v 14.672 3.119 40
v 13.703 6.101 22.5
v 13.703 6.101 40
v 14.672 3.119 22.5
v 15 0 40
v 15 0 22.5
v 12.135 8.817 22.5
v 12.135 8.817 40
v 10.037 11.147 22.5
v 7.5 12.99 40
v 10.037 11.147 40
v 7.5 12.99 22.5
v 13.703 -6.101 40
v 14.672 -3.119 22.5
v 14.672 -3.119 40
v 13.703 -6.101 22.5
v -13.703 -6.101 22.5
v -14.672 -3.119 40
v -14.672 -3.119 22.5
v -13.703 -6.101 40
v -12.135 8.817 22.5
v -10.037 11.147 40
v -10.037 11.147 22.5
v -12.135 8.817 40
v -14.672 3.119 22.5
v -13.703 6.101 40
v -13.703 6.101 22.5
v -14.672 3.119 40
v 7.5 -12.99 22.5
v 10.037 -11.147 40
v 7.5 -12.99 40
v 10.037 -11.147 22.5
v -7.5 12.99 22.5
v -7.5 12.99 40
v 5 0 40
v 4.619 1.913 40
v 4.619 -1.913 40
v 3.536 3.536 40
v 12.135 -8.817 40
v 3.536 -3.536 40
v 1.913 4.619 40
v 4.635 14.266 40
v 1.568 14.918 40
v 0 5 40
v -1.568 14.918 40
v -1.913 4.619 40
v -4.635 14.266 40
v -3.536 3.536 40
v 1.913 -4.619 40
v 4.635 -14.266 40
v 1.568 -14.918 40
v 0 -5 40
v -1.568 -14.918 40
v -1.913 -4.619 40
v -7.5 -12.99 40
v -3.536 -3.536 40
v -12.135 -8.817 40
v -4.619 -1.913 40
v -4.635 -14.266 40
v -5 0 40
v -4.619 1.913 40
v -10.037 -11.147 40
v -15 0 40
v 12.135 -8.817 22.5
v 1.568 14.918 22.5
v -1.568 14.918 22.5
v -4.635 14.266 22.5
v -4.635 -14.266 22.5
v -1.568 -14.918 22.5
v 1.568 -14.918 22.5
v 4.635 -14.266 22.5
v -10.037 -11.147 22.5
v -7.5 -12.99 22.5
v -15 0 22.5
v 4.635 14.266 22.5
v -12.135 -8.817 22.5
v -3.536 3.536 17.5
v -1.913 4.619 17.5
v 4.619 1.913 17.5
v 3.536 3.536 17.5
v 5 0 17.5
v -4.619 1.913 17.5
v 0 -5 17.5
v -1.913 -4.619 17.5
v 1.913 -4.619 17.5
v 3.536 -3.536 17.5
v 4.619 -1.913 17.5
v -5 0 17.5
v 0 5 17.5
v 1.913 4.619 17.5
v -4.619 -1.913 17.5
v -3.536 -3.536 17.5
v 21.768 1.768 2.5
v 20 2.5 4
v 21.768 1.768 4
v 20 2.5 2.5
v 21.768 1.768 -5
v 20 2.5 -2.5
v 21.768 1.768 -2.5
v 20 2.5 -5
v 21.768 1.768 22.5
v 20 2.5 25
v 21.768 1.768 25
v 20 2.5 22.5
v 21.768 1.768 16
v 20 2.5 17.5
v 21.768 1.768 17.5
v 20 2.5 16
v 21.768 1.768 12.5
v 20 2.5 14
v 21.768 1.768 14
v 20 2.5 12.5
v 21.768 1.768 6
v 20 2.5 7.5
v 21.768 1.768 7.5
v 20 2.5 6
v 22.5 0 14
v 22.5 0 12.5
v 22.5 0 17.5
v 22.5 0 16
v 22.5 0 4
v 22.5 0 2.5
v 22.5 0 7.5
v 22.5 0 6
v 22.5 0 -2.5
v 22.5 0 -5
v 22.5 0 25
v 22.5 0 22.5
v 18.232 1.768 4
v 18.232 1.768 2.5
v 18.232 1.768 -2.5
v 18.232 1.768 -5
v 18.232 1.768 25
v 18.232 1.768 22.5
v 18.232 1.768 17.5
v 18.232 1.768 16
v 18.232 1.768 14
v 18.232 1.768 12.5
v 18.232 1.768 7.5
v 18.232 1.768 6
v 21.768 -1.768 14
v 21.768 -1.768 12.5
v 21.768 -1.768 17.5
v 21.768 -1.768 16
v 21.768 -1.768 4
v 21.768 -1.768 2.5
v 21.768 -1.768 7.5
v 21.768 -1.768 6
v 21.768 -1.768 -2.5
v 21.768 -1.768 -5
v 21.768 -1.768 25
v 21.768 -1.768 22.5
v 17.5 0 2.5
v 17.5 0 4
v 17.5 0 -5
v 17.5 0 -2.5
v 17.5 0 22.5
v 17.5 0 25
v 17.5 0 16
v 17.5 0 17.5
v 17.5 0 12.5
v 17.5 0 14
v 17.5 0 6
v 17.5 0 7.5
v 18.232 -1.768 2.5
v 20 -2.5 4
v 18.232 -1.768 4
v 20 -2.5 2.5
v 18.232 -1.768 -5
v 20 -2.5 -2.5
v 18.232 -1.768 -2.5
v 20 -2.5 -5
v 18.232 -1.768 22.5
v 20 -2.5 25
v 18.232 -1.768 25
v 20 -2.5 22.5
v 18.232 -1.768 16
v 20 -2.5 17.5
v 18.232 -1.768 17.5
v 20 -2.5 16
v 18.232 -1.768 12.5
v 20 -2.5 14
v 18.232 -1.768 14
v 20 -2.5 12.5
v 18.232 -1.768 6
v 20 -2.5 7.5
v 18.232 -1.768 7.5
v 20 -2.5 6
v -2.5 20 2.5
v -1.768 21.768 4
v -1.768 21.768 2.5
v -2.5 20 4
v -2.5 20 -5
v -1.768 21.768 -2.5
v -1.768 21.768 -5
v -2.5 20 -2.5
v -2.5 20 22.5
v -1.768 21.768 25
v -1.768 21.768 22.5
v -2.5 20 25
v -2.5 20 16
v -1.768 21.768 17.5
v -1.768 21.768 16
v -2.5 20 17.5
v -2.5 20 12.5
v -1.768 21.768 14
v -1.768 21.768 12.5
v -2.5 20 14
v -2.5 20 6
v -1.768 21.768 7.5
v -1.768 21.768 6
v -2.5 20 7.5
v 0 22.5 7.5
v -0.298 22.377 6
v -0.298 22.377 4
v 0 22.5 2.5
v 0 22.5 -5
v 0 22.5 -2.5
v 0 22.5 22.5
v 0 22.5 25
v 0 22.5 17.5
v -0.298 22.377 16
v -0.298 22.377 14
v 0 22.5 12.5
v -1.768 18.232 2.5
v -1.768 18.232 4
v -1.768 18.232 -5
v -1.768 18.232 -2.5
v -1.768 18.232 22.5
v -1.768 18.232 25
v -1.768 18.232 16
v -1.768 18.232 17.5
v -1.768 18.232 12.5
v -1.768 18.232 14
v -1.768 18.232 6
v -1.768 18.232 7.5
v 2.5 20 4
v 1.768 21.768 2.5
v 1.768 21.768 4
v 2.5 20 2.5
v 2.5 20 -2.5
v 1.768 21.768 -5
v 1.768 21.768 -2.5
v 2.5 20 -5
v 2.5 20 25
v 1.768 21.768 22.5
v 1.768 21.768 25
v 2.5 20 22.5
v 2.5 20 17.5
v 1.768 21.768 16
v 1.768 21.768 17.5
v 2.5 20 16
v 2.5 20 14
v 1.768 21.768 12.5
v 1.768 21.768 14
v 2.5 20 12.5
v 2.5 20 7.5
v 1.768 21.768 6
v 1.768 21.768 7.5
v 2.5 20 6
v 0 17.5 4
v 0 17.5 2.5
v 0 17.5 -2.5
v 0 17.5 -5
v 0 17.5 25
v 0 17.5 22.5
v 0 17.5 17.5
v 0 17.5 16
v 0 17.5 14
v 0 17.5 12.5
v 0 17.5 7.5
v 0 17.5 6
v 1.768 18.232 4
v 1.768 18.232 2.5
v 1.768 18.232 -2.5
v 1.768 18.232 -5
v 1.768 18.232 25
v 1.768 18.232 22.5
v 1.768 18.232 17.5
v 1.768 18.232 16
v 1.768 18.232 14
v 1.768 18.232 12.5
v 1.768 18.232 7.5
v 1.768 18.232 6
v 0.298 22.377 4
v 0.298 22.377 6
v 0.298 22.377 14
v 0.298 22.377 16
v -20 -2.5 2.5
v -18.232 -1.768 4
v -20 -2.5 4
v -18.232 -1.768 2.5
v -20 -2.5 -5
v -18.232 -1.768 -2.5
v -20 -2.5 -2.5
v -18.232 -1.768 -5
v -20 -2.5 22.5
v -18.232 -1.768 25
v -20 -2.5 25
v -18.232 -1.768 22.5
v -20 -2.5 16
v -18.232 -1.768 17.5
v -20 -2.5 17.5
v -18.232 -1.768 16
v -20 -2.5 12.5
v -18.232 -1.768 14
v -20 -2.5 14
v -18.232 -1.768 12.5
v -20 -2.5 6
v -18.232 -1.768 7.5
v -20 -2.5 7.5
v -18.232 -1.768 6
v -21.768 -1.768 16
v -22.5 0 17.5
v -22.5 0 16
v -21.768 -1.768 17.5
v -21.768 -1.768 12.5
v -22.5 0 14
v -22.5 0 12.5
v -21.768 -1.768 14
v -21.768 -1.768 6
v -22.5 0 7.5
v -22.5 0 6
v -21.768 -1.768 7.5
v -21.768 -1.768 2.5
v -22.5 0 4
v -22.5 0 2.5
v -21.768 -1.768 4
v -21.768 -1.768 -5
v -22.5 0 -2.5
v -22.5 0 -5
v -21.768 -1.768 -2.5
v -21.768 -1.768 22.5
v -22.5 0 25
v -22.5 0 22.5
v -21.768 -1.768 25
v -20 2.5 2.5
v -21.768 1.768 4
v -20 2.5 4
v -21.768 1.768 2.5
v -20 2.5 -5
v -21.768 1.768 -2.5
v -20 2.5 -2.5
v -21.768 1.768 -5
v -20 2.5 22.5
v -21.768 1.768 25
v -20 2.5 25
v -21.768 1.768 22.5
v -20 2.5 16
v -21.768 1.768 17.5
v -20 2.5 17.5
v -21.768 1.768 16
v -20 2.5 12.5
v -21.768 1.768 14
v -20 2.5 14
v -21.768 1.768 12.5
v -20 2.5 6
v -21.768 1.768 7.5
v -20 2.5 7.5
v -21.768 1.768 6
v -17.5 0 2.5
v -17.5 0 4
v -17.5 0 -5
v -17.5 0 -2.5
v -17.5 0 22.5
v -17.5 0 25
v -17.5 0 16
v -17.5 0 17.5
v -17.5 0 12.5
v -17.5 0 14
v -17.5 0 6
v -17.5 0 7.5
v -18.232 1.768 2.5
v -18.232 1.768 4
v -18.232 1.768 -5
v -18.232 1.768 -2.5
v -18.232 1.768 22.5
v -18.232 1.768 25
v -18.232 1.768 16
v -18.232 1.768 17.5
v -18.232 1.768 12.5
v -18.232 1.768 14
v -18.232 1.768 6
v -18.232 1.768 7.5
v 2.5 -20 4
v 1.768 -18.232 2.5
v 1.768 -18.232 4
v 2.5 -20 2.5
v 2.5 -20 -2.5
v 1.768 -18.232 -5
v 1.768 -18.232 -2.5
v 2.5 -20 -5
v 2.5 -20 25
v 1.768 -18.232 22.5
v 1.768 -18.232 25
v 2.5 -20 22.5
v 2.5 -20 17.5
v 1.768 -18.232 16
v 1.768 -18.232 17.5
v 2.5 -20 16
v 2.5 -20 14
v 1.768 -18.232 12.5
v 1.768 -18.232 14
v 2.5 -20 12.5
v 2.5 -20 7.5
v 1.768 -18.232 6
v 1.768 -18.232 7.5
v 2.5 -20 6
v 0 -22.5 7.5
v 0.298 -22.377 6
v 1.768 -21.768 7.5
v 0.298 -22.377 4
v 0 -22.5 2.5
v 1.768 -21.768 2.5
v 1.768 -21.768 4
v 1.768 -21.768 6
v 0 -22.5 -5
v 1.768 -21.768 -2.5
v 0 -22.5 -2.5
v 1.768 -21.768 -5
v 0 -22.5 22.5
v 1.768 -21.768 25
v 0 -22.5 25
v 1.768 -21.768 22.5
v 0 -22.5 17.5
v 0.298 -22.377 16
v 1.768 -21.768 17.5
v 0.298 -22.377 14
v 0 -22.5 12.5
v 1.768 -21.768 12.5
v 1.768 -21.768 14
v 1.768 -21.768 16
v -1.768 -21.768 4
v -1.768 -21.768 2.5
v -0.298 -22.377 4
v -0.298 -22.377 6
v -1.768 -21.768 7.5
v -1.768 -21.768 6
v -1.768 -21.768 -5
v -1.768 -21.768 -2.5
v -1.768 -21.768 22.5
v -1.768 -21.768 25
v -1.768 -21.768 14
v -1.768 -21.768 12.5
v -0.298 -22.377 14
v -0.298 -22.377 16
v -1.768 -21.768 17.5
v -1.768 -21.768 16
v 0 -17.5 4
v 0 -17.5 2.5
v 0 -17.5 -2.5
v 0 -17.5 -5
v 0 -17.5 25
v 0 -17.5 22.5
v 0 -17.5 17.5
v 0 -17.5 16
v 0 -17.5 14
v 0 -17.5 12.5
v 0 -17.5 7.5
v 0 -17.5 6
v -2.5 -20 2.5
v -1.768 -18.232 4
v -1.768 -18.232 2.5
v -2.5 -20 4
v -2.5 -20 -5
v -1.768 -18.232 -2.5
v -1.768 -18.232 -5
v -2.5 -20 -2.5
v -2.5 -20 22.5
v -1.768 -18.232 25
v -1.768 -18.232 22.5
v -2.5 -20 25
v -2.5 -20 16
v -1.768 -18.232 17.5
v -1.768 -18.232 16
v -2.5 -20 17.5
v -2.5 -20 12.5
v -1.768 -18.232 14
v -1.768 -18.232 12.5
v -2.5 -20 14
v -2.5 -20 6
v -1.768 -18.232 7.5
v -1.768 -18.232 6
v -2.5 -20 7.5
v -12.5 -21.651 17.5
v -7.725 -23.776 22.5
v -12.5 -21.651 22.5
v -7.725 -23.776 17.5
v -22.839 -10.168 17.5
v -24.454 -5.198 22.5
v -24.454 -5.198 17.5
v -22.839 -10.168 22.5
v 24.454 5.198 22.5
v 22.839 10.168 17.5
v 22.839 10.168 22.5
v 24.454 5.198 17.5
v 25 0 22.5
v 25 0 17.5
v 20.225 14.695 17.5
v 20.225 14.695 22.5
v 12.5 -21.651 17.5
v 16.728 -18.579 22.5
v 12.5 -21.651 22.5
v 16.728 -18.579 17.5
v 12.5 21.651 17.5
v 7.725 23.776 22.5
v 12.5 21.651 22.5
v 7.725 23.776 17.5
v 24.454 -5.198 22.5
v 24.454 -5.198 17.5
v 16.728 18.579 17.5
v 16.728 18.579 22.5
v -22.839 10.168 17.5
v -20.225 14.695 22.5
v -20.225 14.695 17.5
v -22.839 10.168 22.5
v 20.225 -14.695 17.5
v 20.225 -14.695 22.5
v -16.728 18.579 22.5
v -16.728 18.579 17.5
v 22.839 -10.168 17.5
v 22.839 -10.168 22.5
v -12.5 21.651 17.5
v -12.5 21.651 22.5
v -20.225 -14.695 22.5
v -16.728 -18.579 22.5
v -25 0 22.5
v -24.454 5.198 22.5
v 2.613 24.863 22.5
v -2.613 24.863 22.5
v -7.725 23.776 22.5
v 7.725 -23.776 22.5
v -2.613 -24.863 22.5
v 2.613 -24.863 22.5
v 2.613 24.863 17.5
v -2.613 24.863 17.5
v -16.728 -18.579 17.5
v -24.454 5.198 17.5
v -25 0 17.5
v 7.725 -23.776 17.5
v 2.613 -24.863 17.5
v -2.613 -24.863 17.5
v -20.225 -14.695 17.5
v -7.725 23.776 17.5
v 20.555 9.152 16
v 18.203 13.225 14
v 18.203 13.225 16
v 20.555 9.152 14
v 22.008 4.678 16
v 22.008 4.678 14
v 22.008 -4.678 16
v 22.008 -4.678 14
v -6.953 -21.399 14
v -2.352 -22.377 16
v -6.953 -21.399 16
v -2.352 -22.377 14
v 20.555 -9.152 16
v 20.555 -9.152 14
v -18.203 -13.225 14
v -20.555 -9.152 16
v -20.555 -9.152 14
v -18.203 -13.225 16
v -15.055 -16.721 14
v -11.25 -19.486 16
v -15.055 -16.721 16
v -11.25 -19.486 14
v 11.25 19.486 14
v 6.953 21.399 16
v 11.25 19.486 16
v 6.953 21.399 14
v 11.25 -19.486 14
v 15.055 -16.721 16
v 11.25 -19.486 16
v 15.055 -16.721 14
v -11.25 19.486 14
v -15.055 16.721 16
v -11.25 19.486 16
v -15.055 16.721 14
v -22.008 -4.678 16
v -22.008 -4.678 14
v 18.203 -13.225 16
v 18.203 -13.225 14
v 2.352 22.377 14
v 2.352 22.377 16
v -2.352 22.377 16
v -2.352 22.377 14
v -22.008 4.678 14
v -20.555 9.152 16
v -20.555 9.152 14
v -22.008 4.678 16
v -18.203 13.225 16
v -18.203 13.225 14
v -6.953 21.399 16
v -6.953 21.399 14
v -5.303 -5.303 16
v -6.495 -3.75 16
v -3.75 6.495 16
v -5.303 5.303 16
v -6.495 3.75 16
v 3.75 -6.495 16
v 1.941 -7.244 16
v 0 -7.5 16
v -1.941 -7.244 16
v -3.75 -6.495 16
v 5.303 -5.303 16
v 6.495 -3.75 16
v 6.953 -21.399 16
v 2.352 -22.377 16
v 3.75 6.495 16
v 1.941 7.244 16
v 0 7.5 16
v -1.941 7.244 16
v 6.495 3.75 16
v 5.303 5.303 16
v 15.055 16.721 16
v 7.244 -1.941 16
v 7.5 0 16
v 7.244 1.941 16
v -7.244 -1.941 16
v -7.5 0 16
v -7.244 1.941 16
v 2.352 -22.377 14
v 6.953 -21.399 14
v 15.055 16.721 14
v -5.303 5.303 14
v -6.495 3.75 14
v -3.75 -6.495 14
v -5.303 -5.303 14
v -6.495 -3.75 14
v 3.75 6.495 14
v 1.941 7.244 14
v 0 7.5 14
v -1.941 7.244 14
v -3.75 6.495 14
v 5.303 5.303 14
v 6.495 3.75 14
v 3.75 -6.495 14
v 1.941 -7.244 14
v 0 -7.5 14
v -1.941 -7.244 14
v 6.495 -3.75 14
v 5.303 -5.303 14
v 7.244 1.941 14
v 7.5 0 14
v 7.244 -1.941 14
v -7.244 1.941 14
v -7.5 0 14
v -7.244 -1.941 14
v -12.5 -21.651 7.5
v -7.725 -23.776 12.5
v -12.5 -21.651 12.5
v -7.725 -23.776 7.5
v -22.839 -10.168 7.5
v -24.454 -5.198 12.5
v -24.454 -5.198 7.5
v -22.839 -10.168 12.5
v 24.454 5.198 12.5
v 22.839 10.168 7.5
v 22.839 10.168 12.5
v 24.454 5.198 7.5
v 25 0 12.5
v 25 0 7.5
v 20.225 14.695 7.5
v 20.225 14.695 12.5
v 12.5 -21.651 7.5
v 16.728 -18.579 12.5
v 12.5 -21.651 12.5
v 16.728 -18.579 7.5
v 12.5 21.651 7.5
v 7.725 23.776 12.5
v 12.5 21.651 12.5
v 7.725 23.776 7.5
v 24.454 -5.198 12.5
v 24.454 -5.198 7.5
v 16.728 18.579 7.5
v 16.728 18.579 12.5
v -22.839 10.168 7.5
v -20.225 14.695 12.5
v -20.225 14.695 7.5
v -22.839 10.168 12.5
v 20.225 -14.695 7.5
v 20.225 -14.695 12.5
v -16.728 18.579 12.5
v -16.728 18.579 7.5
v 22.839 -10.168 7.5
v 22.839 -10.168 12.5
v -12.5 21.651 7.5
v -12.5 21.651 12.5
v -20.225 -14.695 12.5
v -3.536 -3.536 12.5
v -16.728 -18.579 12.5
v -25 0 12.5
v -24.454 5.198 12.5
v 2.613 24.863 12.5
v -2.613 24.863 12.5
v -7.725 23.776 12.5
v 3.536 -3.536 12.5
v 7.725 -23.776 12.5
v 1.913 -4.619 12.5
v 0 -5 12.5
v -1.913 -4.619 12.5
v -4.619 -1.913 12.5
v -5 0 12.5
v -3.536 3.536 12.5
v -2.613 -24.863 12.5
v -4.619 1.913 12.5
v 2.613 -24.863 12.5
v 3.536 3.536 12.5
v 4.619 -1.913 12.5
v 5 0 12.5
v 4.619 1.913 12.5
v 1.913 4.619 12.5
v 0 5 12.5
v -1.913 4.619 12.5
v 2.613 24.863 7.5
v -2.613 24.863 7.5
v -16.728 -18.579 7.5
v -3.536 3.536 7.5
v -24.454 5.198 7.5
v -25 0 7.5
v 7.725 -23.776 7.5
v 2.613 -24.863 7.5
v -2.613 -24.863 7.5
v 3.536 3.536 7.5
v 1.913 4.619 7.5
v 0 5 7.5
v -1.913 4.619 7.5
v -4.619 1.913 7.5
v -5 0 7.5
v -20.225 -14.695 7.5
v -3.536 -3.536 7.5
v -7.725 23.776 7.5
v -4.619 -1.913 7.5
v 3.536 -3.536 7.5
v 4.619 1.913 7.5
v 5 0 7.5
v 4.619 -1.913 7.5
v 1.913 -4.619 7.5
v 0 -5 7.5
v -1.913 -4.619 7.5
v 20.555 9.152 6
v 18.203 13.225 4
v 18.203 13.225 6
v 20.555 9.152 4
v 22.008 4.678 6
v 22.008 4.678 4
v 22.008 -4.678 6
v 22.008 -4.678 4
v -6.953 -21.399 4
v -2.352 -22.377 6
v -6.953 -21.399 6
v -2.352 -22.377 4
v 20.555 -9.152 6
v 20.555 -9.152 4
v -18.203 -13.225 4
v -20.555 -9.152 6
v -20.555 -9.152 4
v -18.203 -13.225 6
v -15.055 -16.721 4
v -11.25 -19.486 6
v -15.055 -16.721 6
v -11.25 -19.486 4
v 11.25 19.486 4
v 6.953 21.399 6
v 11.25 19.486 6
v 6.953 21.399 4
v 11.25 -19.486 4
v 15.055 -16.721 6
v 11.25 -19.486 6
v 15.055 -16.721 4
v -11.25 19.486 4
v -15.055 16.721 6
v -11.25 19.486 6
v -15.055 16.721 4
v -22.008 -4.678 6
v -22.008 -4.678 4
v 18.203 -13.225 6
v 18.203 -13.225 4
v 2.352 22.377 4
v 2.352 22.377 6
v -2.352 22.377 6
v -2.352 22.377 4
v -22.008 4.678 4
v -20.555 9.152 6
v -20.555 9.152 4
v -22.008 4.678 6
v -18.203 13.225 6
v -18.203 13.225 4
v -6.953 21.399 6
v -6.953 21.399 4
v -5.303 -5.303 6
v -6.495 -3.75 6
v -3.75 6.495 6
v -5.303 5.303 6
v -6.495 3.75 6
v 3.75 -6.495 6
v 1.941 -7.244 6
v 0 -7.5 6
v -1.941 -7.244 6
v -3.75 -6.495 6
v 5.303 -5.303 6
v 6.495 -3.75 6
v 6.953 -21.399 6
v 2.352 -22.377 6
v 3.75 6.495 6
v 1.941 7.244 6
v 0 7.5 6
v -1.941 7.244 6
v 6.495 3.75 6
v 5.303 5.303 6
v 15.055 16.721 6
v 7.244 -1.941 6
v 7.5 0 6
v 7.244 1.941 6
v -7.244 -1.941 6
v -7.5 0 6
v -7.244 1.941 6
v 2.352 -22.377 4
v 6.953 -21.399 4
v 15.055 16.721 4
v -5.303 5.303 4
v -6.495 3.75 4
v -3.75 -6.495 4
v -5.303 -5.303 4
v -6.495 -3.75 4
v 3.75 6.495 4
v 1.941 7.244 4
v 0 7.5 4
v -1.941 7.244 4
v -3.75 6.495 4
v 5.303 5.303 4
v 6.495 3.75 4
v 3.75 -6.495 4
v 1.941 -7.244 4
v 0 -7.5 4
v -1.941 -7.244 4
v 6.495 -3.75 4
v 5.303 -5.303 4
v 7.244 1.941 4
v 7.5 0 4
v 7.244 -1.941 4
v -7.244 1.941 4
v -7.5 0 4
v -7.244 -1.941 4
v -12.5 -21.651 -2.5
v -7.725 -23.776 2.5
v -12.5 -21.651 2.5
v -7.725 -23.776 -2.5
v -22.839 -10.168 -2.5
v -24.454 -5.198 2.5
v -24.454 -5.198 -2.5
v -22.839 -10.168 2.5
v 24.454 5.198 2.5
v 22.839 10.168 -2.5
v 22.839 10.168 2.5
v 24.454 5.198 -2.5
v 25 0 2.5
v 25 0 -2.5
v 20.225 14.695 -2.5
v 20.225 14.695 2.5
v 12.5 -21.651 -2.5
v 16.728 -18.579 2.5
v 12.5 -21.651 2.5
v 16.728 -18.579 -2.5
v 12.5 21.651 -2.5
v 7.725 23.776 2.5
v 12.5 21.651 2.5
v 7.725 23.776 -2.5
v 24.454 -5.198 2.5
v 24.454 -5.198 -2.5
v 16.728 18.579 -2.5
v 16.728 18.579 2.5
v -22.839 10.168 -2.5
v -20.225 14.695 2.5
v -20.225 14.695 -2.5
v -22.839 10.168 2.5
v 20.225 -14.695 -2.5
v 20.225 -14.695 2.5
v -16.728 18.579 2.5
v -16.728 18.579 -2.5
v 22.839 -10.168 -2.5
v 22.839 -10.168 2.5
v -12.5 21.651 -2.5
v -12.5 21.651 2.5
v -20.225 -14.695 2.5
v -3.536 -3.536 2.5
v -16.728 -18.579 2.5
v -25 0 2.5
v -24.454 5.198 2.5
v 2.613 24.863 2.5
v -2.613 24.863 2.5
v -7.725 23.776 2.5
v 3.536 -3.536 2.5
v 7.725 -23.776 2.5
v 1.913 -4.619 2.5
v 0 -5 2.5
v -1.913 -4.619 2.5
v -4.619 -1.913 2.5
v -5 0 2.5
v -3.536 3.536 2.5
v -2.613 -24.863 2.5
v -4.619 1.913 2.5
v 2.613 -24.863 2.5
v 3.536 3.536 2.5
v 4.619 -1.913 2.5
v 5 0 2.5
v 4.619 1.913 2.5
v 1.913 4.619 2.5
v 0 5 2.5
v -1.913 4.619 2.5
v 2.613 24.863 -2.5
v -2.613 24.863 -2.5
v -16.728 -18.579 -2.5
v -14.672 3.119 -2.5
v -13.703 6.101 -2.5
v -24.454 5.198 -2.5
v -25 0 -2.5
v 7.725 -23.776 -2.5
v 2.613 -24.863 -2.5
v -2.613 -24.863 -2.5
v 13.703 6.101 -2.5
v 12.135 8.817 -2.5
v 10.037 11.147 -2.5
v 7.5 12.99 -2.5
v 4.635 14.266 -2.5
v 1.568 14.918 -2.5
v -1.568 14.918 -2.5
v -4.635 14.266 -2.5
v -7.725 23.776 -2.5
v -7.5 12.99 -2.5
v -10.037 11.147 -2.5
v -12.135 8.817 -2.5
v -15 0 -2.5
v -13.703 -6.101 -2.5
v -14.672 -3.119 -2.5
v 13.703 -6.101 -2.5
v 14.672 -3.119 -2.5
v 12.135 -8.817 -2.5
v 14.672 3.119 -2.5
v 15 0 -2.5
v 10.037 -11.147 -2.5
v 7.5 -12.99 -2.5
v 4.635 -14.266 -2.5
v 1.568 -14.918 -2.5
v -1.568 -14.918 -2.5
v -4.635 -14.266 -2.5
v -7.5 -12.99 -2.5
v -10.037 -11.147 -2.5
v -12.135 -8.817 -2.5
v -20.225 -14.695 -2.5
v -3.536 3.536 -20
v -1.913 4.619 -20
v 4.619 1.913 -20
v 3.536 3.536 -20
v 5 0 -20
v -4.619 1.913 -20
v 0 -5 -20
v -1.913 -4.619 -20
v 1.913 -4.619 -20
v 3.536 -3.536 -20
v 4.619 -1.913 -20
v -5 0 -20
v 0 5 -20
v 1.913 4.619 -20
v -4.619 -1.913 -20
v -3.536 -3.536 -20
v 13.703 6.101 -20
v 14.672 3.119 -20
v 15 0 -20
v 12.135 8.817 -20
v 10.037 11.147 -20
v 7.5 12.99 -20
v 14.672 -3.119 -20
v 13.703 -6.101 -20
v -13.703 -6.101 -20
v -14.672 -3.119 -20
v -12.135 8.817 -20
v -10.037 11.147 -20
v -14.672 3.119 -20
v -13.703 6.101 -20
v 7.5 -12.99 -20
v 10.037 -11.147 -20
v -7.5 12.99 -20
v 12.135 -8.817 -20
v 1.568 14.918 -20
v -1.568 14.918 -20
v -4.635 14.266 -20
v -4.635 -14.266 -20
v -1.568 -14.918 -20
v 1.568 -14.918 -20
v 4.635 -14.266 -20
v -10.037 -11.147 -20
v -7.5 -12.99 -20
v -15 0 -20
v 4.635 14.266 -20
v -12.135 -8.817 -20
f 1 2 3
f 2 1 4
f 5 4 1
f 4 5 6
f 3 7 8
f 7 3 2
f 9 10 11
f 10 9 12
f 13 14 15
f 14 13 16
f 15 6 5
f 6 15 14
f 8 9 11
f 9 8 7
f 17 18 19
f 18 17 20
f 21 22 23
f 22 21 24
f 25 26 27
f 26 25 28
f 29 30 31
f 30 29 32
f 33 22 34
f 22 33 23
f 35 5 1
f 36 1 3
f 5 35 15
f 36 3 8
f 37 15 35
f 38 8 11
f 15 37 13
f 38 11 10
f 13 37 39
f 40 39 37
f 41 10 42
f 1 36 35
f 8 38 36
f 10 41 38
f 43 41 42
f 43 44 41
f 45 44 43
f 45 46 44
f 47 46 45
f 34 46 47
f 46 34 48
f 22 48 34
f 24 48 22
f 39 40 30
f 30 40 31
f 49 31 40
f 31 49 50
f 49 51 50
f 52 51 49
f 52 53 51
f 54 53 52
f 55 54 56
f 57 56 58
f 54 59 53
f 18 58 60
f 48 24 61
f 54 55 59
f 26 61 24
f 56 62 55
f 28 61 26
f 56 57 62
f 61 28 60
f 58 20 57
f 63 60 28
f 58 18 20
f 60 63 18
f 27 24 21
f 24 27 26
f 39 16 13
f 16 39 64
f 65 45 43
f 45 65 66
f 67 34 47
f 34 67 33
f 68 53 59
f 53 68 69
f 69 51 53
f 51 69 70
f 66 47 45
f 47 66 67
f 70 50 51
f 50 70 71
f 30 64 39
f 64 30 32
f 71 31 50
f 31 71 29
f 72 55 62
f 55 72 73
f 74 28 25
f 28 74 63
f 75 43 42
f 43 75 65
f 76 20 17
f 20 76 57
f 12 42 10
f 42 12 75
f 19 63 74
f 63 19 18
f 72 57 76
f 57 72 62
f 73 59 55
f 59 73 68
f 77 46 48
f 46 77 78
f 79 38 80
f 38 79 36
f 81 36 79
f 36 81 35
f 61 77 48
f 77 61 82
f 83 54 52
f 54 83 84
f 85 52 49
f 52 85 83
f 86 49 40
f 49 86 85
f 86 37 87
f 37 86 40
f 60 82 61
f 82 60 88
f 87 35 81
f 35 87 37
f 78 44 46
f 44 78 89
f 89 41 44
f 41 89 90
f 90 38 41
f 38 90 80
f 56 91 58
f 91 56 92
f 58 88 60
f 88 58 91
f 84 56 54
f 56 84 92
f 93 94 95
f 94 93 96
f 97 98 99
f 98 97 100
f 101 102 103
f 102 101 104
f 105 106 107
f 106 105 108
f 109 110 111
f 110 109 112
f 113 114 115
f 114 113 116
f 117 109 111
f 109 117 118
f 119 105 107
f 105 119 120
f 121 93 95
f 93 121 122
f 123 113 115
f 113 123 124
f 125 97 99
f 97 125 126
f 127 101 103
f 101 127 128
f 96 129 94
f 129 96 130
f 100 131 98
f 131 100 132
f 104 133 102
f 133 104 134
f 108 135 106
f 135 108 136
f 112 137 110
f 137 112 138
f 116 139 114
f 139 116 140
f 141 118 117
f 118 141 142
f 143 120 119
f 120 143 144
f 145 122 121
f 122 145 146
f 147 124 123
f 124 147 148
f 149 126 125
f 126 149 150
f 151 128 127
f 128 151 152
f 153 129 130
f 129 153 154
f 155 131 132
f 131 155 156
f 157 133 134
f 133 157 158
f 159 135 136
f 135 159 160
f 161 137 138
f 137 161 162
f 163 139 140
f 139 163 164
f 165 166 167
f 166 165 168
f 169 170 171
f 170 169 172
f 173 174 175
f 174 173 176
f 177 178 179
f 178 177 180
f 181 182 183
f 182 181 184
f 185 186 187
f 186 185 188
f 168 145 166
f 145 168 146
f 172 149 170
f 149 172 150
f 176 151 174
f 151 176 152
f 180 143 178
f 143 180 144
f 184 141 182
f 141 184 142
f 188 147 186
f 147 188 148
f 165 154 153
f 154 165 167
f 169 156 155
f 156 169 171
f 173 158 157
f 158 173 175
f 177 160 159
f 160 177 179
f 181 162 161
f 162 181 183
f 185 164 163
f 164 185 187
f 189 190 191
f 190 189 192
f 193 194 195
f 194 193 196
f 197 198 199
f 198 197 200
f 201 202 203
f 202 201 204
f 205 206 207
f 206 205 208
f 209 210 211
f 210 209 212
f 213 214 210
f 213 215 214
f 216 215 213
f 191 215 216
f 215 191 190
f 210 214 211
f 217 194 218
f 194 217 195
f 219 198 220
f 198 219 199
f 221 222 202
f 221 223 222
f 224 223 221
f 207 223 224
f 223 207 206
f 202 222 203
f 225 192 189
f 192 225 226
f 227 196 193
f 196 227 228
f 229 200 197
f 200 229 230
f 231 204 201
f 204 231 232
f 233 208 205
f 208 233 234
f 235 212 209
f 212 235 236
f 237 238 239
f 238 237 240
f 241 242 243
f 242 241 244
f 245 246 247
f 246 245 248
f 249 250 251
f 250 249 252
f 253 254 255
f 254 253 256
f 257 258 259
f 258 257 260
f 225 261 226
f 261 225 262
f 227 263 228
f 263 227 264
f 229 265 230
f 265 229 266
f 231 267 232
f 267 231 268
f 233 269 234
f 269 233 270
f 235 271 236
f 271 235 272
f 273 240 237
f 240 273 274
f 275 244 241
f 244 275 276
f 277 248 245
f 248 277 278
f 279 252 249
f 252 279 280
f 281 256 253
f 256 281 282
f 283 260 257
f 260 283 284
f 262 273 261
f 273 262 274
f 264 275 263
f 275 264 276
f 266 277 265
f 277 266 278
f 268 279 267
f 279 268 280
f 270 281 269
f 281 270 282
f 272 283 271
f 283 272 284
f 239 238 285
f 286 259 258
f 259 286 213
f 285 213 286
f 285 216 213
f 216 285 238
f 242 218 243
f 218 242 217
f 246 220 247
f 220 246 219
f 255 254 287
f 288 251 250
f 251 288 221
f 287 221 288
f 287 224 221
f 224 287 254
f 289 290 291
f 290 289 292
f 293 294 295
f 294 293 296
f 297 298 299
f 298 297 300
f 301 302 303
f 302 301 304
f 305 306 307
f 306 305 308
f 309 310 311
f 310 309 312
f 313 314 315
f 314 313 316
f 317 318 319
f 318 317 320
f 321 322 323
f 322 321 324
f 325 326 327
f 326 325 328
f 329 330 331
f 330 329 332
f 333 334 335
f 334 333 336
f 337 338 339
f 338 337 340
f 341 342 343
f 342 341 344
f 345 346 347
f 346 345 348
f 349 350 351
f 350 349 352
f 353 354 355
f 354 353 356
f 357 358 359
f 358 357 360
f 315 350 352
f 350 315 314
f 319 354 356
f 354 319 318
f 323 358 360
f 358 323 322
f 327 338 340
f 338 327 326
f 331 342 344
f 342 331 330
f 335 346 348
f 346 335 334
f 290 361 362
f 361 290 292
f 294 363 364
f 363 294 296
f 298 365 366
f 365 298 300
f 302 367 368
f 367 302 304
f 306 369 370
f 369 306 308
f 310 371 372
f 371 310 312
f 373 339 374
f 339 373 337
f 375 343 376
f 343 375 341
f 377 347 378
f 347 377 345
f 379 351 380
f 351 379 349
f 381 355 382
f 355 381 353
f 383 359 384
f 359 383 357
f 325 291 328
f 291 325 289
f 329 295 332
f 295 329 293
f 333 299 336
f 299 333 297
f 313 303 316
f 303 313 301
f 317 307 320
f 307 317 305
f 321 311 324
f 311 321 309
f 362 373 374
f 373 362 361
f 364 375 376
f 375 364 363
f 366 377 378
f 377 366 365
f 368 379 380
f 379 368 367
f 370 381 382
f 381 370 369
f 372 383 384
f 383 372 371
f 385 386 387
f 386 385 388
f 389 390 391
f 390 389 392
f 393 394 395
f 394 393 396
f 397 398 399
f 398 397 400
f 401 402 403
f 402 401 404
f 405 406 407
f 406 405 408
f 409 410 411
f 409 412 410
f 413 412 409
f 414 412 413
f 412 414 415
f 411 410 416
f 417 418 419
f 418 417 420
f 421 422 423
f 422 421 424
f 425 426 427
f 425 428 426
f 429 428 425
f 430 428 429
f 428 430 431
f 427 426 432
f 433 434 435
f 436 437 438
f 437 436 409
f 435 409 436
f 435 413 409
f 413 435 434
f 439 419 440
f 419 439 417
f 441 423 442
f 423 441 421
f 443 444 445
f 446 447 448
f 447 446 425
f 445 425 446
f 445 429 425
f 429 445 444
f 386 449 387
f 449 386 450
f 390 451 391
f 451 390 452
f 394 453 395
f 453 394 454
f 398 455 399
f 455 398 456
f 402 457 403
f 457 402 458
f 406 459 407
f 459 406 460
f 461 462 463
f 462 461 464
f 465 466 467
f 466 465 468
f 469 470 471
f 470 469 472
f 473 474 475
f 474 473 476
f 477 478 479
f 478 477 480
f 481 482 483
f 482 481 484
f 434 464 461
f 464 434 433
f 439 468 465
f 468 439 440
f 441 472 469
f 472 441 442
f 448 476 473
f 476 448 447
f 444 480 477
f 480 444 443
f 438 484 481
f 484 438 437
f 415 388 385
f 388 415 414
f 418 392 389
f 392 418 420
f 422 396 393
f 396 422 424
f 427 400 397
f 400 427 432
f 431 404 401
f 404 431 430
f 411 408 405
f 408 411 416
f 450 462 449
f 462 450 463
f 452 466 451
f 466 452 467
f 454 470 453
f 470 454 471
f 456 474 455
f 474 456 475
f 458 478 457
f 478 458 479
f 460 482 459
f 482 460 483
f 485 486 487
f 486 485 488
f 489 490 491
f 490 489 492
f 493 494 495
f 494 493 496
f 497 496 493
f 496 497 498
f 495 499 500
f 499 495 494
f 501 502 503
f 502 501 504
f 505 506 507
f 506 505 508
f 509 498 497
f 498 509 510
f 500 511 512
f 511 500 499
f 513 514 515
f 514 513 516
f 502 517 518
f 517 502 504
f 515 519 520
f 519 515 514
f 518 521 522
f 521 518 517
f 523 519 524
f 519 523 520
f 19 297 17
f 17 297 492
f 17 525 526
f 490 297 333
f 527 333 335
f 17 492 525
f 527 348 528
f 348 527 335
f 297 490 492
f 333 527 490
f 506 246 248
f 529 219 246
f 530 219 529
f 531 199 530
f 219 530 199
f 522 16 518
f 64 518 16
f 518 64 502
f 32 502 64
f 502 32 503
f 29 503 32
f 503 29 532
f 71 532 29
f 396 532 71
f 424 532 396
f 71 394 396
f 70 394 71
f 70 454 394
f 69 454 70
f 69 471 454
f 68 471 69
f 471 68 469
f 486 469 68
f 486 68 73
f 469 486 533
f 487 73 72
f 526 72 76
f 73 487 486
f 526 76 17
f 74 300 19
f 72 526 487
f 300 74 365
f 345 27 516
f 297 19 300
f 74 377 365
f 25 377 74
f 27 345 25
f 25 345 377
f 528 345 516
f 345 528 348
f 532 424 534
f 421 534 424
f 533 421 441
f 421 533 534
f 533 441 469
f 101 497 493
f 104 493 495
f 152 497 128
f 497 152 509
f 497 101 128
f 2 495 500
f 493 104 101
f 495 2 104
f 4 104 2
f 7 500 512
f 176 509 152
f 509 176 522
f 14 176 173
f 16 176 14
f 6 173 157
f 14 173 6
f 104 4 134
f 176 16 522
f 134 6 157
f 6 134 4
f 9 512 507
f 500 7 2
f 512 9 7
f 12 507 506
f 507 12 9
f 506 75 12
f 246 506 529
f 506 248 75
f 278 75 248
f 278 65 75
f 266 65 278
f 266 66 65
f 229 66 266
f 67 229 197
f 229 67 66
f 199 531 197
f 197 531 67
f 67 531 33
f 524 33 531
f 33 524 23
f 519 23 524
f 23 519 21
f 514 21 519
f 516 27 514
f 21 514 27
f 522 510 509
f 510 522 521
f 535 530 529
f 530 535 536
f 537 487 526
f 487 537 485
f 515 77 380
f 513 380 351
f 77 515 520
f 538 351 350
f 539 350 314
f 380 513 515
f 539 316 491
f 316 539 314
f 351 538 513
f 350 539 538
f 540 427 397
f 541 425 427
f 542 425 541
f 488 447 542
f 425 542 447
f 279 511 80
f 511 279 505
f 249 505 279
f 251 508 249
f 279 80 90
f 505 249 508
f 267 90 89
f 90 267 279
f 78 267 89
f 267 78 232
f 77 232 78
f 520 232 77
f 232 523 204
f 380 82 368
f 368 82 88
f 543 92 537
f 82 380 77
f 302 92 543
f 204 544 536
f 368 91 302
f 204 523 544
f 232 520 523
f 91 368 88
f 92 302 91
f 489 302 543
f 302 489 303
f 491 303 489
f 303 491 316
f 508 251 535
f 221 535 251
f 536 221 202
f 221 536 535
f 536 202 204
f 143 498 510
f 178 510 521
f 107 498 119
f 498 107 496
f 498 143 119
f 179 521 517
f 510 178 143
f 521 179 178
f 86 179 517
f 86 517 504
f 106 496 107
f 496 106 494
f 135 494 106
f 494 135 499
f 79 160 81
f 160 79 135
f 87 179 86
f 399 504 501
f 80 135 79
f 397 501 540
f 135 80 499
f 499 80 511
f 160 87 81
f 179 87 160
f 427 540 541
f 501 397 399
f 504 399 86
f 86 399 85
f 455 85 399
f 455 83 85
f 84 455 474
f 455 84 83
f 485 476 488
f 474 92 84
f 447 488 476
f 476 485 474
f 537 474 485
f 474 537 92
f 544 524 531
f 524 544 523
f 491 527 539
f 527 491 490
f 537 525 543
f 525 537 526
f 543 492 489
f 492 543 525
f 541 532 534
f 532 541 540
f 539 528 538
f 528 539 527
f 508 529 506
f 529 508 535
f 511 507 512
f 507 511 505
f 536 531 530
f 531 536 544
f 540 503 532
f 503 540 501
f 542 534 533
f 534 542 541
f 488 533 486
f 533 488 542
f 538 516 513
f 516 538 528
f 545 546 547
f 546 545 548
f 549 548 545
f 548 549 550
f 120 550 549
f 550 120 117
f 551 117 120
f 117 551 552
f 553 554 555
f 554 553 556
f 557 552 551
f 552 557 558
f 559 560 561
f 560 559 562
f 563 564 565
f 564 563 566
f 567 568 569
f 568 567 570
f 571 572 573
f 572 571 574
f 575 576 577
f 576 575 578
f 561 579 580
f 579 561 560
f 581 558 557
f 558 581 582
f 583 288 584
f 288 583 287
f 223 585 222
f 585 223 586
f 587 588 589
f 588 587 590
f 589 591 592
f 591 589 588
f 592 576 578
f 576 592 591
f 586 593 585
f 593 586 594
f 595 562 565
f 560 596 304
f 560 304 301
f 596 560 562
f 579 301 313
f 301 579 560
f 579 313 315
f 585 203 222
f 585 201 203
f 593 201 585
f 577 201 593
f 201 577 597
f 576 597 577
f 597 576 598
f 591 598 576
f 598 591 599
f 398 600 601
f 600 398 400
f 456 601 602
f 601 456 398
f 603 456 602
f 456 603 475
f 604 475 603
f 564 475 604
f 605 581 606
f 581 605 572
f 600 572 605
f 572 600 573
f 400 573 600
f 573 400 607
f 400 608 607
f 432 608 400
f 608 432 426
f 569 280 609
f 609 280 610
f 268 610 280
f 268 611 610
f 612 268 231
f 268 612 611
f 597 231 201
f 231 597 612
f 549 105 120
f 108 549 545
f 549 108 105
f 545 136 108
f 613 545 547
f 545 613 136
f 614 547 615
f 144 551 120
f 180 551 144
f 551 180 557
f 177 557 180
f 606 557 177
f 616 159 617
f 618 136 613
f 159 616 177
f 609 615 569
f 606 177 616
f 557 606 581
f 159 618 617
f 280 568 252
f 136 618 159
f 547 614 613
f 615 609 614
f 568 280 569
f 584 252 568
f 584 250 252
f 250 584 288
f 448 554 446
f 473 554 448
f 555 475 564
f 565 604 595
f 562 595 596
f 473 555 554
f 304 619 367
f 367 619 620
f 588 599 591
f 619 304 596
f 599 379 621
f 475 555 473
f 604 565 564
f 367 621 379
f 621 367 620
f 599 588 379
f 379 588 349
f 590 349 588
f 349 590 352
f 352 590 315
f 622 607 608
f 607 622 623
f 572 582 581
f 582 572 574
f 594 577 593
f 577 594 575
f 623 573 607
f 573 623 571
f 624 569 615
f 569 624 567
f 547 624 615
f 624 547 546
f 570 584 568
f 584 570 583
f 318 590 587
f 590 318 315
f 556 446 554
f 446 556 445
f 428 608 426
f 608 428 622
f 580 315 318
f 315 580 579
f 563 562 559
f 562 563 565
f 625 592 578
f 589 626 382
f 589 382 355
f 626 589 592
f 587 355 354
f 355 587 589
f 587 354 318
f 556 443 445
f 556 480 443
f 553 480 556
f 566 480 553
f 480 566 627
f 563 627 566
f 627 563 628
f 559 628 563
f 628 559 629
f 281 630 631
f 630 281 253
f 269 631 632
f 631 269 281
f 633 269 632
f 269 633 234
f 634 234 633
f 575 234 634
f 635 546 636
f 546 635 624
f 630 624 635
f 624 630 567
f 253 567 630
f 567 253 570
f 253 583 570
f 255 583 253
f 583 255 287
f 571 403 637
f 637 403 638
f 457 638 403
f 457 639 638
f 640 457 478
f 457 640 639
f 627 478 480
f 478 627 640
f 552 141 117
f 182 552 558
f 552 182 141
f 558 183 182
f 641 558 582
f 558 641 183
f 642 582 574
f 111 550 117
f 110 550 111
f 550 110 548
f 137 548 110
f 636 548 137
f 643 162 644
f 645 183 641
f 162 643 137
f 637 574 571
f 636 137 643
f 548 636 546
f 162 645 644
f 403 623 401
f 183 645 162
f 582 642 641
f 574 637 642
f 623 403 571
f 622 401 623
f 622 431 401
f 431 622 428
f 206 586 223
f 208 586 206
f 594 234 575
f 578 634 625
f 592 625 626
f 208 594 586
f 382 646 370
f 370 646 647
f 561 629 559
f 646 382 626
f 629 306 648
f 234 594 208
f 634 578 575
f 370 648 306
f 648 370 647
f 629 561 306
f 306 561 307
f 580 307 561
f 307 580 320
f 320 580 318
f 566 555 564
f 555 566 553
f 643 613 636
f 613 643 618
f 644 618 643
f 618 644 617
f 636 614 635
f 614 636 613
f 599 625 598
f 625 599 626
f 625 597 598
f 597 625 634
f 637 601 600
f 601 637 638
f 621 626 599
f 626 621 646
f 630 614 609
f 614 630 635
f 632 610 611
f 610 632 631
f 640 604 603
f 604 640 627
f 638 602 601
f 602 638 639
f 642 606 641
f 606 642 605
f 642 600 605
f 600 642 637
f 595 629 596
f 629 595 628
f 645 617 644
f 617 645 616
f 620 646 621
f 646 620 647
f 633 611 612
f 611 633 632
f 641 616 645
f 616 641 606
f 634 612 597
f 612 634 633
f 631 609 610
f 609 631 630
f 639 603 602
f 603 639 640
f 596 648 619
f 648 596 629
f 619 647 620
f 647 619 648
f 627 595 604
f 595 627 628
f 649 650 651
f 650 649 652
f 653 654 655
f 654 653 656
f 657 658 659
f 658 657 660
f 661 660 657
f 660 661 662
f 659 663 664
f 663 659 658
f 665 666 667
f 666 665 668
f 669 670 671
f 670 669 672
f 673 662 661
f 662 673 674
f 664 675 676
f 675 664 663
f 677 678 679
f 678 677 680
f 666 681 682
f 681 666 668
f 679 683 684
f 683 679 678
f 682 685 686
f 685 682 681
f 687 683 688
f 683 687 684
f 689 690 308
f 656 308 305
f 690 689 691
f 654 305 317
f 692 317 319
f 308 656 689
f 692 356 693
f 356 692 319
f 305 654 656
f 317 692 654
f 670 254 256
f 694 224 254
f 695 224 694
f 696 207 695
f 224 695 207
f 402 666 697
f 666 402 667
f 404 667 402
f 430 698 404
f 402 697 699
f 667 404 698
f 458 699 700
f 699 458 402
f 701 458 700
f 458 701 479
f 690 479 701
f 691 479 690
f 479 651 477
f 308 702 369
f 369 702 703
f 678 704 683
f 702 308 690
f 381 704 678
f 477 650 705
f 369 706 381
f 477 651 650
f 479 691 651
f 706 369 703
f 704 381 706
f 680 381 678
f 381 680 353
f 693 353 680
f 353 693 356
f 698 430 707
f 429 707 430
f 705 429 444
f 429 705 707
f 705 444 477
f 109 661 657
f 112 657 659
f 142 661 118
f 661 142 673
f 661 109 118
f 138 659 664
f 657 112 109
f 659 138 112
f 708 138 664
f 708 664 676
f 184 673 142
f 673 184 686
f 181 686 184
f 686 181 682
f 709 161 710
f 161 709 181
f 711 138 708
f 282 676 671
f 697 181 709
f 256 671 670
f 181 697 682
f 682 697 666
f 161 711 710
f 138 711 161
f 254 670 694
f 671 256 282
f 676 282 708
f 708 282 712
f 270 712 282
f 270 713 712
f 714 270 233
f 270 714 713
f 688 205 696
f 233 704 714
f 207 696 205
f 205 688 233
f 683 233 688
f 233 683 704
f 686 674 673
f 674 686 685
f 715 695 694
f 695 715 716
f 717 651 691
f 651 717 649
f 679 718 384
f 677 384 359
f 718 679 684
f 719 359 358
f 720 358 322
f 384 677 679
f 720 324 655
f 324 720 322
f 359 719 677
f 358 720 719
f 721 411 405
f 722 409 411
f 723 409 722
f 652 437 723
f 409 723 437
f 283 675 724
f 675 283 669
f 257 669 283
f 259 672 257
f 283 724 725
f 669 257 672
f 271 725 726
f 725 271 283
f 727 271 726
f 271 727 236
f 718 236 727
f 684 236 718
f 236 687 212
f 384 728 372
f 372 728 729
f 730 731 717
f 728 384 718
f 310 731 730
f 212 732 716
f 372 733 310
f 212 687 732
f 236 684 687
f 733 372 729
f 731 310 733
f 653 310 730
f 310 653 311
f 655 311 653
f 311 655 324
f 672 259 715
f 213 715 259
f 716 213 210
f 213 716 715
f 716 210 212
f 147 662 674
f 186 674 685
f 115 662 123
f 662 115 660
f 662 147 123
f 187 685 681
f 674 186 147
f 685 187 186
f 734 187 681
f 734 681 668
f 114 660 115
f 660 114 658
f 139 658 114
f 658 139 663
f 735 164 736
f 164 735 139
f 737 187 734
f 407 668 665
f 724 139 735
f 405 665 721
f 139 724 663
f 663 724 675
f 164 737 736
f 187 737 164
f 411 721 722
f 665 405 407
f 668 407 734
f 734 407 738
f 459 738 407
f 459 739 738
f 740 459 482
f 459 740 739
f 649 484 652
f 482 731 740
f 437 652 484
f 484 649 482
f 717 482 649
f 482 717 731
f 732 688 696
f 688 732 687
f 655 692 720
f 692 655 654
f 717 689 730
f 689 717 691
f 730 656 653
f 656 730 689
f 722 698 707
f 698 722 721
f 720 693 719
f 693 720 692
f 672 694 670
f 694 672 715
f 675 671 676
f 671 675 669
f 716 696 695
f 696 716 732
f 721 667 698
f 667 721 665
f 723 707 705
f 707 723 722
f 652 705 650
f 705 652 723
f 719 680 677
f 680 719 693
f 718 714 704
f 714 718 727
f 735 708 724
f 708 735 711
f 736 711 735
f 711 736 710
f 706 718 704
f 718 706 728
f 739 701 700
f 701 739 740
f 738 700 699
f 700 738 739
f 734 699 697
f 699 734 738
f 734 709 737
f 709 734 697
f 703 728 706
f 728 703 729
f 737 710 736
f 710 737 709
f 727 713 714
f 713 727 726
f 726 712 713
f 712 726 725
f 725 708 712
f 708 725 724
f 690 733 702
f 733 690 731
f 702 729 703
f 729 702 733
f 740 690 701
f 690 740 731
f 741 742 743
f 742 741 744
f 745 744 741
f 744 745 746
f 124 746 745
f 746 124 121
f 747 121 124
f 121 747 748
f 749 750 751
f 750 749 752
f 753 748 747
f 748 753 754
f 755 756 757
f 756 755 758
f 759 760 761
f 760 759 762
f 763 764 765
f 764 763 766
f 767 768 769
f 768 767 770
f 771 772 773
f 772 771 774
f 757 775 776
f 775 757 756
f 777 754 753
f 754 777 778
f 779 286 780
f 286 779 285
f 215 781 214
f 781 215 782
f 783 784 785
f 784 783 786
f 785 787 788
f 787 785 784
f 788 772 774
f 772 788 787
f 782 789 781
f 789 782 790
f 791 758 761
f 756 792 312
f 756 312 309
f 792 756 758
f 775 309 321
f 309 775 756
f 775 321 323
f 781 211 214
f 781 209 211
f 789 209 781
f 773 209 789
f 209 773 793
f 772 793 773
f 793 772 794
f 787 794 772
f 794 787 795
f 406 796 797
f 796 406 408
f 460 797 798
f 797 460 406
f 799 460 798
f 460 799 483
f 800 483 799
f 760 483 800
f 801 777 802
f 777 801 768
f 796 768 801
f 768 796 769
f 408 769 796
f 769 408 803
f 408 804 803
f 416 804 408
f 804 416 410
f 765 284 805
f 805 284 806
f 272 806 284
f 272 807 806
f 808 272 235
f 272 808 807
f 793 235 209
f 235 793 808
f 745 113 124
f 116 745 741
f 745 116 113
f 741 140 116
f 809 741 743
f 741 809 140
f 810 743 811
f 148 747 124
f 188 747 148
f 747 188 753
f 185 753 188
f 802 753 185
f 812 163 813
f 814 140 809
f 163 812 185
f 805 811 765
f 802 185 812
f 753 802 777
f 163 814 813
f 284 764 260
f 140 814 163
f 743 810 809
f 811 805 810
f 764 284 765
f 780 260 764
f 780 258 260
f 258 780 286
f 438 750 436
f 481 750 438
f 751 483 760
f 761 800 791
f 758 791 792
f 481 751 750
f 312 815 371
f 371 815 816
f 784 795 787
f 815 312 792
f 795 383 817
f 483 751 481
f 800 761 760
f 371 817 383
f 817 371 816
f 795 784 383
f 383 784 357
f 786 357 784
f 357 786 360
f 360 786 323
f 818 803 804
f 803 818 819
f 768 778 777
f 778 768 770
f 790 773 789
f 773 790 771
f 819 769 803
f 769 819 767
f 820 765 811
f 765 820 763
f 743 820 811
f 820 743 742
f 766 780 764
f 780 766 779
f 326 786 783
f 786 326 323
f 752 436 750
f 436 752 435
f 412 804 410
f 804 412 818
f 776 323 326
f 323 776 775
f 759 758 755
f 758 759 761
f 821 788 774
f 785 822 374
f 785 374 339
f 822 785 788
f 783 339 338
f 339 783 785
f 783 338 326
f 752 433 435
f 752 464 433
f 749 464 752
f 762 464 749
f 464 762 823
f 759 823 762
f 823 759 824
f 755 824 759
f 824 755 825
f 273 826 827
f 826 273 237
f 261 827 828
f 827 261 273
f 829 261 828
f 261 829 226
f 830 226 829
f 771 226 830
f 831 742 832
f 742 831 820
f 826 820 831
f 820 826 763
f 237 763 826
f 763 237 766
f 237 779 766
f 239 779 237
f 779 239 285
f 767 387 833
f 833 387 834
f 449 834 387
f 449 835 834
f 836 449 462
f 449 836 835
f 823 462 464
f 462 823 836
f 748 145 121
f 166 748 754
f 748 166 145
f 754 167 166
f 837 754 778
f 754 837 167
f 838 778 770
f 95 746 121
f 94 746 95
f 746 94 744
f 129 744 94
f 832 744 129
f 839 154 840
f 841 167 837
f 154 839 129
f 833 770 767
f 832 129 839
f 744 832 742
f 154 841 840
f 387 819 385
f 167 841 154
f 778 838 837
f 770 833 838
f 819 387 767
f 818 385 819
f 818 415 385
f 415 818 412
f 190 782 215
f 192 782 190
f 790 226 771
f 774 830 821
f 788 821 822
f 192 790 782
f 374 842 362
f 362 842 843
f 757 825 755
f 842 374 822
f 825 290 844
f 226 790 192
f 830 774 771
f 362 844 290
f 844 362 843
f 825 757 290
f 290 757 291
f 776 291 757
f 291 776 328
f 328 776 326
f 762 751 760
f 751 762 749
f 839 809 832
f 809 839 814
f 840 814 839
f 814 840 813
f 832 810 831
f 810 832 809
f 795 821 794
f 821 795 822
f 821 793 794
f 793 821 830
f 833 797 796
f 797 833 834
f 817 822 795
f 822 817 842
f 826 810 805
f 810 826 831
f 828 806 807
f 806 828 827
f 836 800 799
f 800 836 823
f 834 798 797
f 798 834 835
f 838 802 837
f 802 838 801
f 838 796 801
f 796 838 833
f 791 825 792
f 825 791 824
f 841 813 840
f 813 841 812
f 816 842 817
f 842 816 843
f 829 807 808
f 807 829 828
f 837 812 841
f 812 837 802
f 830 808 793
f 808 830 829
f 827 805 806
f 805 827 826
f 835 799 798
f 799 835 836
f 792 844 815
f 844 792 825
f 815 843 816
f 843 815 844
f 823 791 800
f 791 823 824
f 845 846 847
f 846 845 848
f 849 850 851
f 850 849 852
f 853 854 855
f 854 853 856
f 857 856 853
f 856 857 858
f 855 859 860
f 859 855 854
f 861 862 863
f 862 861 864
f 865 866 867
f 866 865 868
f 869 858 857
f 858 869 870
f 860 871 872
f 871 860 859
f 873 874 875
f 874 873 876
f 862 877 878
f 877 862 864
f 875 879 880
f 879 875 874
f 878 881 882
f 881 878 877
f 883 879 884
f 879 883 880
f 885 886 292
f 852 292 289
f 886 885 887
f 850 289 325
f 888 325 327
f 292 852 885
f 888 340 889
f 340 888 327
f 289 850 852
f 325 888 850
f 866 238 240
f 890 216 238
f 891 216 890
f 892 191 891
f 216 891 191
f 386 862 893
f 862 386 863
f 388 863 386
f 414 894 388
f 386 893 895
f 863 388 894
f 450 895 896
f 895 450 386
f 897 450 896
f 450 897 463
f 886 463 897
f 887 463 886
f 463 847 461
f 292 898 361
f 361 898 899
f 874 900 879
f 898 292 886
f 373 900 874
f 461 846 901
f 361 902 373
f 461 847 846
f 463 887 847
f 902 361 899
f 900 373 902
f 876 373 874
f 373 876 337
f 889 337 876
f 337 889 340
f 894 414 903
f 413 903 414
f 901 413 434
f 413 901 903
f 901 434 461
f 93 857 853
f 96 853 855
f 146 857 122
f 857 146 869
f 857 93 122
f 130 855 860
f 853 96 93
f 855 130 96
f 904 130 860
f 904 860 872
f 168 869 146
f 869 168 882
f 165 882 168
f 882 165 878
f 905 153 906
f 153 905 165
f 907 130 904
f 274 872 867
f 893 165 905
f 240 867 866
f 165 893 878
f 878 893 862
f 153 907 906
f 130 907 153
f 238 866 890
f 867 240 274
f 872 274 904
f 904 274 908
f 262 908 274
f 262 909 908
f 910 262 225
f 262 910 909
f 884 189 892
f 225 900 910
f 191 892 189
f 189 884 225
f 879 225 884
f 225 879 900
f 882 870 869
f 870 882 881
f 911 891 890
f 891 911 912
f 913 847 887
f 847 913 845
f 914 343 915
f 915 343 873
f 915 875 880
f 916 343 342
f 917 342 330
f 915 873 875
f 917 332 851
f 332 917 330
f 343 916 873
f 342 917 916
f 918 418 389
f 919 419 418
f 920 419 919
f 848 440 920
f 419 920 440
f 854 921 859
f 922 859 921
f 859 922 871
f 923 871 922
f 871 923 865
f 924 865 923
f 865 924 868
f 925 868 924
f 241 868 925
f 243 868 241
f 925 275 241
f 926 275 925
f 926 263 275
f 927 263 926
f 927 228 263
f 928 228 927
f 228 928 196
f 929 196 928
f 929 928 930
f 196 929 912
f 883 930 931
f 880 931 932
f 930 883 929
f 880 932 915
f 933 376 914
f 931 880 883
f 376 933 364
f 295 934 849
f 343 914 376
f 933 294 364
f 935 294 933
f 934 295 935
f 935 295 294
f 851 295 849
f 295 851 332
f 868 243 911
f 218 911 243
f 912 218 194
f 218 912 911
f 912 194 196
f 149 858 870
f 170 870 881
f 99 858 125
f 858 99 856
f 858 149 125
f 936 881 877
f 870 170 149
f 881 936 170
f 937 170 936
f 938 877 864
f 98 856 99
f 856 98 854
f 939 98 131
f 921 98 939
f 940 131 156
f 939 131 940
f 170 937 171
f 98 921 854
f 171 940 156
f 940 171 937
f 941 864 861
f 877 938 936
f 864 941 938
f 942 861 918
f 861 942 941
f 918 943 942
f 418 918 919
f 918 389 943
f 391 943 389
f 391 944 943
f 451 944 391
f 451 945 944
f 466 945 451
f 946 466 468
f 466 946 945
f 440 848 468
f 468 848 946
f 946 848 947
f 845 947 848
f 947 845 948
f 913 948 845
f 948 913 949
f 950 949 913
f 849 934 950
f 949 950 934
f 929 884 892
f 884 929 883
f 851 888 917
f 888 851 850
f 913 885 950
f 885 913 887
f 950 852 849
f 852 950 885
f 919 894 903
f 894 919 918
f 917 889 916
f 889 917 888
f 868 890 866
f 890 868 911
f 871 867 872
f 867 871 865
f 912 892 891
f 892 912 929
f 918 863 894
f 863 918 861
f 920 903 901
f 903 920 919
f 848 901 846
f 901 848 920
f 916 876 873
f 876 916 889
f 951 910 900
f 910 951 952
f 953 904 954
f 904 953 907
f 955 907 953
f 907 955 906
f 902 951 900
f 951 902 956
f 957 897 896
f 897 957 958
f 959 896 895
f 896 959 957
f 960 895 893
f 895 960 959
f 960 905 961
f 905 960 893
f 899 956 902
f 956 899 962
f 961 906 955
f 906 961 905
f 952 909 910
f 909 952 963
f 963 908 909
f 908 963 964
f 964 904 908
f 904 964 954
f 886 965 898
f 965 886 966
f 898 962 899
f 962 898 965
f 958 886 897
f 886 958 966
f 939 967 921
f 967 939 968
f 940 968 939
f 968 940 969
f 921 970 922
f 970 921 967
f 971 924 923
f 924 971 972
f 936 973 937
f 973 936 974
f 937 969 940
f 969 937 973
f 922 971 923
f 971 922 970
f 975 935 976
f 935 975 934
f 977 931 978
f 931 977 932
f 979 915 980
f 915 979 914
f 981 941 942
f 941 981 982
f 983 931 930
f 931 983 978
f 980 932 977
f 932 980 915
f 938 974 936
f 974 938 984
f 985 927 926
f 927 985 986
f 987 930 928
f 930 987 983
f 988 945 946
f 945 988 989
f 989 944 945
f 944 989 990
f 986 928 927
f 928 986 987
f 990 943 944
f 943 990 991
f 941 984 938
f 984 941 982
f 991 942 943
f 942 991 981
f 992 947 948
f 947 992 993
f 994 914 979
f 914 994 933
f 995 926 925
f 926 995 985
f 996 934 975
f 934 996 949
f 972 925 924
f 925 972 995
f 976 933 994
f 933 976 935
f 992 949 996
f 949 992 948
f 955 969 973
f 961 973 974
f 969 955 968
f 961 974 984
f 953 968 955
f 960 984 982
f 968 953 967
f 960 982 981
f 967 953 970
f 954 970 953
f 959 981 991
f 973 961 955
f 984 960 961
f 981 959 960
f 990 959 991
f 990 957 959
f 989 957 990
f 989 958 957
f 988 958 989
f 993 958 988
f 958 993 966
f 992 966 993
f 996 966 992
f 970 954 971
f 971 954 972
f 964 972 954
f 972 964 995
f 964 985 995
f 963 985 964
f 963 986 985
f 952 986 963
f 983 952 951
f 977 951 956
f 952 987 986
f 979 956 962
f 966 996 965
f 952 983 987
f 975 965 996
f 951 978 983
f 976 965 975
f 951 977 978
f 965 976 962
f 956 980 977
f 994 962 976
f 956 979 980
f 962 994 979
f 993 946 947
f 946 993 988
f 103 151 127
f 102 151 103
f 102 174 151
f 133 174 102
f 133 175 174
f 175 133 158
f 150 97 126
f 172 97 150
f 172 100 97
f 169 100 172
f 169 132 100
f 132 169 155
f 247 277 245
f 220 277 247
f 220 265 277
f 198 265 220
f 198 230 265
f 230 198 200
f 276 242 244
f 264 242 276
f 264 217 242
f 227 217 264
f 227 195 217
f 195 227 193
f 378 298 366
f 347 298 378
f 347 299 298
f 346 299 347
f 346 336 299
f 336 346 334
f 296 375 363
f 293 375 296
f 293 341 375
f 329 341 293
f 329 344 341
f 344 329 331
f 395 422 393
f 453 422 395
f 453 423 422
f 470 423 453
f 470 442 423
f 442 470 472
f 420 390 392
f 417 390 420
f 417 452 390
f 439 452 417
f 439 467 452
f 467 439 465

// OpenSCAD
// Parameters
shaft_diameter = 10;
flange_diameter = 50;
flange_thickness = 5;
spacer_thickness = 2;
bolt_diameter = 5;
bolt_length = 20;
nut_size = 8;
nut_thickness = 4;
spacing = 10;

// Function to create a cylindrical component with a central bore
module craft() {
    difference() {
        cylinder(h = 20, d = 30, center = true);
        cylinder(h = 25, d = shaft_diameter, center = true);
    }
}

// Function to create a flange plate with bolt holes
module flange_plate() {
    difference() {
        cylinder(h = flange_thickness, d = flange_diameter, center = true);
        cylinder(h = flange_thickness + 2, d = shaft_diameter, center = true);
        for (i = [0:3]) {
            rotate([0, 0, i * 90])
                translate([flange_diameter / 2.5, 0, 0])
                cylinder(h = flange_thickness + 2, d = bolt_diameter, center = true);
        }
    }
}

// Function to create a spacer ring
module spacer_ring() {
    difference() {
        cylinder(h = spacer_thickness, d = flange_diameter - 5, center = true);
        cylinder(h = spacer_thickness + 2, d = shaft_diameter + 5, center = true);
    }
}

// Function to create a bolt
module bolt() {
    cylinder(h = bolt_length, d = bolt_diameter, center = true);
}

// Function to create a nut
module nut() {
    cylinder(h = nut_thickness, d = nut_size, $fn = 6, center = true);
}

// Assembly of the coupling
module coupling() {
    translate([0, 0, spacing * 3]) craft(); // Input craft
    translate([0, 0, spacing * 2]) flange_plate(); // First flange plate
    translate([0, 0, spacing * 1.5]) spacer_ring(); // First spacer ring
    translate([0, 0, spacing]) flange_plate(); // Second flange plate
    translate([0, 0, spacing * 0.5]) spacer_ring(); // Second spacer ring
    translate([0, 0, 0]) flange_plate(); // Third flange plate
    translate([0, 0, -spacing]) craft(); // Output craft

    // Bolts and nuts
    for (i = [0:3]) {
        rotate([0, 0, i * 90])
            translate([flange_diameter / 2.5, 0, spacing * 1.5])
            bolt();
        rotate([0, 0, i * 90])
            translate([flange_diameter / 2.5, 0, spacing * 2])
            nut();
        rotate([0, 0, i * 90])
            translate([flange_diameter / 2.5, 0, spacing * 0.5])
            bolt();
        rotate([0, 0, i * 90])
            translate([flange_diameter / 2.5, 0, 0])
            nut();
    }
}

// Render the coupling
coupling();
